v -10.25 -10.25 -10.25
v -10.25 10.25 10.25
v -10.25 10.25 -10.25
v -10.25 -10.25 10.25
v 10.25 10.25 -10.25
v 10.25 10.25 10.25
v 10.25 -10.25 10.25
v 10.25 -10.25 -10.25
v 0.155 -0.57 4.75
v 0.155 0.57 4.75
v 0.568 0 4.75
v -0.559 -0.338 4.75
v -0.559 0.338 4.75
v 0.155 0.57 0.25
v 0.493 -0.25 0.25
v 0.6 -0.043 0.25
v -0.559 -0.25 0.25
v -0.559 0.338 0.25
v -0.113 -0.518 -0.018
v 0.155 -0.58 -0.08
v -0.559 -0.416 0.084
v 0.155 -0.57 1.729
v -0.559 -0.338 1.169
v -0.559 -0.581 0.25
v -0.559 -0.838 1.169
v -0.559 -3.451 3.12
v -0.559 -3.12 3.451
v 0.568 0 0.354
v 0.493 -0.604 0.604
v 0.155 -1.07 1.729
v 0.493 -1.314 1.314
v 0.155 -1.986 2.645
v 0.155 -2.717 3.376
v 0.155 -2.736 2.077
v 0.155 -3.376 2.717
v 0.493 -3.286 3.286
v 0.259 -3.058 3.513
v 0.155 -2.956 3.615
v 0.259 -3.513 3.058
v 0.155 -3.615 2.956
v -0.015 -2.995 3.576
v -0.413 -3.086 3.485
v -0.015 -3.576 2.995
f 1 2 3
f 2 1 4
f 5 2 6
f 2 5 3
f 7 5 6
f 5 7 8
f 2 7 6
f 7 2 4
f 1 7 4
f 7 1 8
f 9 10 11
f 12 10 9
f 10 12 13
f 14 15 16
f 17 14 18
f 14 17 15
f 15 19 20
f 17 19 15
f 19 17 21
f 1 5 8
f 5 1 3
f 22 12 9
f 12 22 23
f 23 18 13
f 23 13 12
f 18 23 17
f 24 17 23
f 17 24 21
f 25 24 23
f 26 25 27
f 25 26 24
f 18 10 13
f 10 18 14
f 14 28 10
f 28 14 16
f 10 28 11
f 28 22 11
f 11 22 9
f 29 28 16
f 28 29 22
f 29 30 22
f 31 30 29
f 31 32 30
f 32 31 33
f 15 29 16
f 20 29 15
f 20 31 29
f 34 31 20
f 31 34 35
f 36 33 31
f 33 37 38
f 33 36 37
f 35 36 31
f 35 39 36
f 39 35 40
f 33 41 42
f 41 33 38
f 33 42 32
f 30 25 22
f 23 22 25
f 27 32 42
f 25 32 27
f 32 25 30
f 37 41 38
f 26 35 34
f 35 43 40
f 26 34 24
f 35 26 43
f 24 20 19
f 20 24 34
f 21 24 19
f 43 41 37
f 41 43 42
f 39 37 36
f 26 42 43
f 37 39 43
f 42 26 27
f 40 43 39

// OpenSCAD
$fn = 5;

module object() {
  cylinder(r = 1, h = 5);
  rotate(45, [1, 0, 0]) cylinder(r = 1, h = 5);
}

minkowski() {
  difference() {
    cube(20, center = true);
    object();
  }
  cube(.5, center = true);
}
